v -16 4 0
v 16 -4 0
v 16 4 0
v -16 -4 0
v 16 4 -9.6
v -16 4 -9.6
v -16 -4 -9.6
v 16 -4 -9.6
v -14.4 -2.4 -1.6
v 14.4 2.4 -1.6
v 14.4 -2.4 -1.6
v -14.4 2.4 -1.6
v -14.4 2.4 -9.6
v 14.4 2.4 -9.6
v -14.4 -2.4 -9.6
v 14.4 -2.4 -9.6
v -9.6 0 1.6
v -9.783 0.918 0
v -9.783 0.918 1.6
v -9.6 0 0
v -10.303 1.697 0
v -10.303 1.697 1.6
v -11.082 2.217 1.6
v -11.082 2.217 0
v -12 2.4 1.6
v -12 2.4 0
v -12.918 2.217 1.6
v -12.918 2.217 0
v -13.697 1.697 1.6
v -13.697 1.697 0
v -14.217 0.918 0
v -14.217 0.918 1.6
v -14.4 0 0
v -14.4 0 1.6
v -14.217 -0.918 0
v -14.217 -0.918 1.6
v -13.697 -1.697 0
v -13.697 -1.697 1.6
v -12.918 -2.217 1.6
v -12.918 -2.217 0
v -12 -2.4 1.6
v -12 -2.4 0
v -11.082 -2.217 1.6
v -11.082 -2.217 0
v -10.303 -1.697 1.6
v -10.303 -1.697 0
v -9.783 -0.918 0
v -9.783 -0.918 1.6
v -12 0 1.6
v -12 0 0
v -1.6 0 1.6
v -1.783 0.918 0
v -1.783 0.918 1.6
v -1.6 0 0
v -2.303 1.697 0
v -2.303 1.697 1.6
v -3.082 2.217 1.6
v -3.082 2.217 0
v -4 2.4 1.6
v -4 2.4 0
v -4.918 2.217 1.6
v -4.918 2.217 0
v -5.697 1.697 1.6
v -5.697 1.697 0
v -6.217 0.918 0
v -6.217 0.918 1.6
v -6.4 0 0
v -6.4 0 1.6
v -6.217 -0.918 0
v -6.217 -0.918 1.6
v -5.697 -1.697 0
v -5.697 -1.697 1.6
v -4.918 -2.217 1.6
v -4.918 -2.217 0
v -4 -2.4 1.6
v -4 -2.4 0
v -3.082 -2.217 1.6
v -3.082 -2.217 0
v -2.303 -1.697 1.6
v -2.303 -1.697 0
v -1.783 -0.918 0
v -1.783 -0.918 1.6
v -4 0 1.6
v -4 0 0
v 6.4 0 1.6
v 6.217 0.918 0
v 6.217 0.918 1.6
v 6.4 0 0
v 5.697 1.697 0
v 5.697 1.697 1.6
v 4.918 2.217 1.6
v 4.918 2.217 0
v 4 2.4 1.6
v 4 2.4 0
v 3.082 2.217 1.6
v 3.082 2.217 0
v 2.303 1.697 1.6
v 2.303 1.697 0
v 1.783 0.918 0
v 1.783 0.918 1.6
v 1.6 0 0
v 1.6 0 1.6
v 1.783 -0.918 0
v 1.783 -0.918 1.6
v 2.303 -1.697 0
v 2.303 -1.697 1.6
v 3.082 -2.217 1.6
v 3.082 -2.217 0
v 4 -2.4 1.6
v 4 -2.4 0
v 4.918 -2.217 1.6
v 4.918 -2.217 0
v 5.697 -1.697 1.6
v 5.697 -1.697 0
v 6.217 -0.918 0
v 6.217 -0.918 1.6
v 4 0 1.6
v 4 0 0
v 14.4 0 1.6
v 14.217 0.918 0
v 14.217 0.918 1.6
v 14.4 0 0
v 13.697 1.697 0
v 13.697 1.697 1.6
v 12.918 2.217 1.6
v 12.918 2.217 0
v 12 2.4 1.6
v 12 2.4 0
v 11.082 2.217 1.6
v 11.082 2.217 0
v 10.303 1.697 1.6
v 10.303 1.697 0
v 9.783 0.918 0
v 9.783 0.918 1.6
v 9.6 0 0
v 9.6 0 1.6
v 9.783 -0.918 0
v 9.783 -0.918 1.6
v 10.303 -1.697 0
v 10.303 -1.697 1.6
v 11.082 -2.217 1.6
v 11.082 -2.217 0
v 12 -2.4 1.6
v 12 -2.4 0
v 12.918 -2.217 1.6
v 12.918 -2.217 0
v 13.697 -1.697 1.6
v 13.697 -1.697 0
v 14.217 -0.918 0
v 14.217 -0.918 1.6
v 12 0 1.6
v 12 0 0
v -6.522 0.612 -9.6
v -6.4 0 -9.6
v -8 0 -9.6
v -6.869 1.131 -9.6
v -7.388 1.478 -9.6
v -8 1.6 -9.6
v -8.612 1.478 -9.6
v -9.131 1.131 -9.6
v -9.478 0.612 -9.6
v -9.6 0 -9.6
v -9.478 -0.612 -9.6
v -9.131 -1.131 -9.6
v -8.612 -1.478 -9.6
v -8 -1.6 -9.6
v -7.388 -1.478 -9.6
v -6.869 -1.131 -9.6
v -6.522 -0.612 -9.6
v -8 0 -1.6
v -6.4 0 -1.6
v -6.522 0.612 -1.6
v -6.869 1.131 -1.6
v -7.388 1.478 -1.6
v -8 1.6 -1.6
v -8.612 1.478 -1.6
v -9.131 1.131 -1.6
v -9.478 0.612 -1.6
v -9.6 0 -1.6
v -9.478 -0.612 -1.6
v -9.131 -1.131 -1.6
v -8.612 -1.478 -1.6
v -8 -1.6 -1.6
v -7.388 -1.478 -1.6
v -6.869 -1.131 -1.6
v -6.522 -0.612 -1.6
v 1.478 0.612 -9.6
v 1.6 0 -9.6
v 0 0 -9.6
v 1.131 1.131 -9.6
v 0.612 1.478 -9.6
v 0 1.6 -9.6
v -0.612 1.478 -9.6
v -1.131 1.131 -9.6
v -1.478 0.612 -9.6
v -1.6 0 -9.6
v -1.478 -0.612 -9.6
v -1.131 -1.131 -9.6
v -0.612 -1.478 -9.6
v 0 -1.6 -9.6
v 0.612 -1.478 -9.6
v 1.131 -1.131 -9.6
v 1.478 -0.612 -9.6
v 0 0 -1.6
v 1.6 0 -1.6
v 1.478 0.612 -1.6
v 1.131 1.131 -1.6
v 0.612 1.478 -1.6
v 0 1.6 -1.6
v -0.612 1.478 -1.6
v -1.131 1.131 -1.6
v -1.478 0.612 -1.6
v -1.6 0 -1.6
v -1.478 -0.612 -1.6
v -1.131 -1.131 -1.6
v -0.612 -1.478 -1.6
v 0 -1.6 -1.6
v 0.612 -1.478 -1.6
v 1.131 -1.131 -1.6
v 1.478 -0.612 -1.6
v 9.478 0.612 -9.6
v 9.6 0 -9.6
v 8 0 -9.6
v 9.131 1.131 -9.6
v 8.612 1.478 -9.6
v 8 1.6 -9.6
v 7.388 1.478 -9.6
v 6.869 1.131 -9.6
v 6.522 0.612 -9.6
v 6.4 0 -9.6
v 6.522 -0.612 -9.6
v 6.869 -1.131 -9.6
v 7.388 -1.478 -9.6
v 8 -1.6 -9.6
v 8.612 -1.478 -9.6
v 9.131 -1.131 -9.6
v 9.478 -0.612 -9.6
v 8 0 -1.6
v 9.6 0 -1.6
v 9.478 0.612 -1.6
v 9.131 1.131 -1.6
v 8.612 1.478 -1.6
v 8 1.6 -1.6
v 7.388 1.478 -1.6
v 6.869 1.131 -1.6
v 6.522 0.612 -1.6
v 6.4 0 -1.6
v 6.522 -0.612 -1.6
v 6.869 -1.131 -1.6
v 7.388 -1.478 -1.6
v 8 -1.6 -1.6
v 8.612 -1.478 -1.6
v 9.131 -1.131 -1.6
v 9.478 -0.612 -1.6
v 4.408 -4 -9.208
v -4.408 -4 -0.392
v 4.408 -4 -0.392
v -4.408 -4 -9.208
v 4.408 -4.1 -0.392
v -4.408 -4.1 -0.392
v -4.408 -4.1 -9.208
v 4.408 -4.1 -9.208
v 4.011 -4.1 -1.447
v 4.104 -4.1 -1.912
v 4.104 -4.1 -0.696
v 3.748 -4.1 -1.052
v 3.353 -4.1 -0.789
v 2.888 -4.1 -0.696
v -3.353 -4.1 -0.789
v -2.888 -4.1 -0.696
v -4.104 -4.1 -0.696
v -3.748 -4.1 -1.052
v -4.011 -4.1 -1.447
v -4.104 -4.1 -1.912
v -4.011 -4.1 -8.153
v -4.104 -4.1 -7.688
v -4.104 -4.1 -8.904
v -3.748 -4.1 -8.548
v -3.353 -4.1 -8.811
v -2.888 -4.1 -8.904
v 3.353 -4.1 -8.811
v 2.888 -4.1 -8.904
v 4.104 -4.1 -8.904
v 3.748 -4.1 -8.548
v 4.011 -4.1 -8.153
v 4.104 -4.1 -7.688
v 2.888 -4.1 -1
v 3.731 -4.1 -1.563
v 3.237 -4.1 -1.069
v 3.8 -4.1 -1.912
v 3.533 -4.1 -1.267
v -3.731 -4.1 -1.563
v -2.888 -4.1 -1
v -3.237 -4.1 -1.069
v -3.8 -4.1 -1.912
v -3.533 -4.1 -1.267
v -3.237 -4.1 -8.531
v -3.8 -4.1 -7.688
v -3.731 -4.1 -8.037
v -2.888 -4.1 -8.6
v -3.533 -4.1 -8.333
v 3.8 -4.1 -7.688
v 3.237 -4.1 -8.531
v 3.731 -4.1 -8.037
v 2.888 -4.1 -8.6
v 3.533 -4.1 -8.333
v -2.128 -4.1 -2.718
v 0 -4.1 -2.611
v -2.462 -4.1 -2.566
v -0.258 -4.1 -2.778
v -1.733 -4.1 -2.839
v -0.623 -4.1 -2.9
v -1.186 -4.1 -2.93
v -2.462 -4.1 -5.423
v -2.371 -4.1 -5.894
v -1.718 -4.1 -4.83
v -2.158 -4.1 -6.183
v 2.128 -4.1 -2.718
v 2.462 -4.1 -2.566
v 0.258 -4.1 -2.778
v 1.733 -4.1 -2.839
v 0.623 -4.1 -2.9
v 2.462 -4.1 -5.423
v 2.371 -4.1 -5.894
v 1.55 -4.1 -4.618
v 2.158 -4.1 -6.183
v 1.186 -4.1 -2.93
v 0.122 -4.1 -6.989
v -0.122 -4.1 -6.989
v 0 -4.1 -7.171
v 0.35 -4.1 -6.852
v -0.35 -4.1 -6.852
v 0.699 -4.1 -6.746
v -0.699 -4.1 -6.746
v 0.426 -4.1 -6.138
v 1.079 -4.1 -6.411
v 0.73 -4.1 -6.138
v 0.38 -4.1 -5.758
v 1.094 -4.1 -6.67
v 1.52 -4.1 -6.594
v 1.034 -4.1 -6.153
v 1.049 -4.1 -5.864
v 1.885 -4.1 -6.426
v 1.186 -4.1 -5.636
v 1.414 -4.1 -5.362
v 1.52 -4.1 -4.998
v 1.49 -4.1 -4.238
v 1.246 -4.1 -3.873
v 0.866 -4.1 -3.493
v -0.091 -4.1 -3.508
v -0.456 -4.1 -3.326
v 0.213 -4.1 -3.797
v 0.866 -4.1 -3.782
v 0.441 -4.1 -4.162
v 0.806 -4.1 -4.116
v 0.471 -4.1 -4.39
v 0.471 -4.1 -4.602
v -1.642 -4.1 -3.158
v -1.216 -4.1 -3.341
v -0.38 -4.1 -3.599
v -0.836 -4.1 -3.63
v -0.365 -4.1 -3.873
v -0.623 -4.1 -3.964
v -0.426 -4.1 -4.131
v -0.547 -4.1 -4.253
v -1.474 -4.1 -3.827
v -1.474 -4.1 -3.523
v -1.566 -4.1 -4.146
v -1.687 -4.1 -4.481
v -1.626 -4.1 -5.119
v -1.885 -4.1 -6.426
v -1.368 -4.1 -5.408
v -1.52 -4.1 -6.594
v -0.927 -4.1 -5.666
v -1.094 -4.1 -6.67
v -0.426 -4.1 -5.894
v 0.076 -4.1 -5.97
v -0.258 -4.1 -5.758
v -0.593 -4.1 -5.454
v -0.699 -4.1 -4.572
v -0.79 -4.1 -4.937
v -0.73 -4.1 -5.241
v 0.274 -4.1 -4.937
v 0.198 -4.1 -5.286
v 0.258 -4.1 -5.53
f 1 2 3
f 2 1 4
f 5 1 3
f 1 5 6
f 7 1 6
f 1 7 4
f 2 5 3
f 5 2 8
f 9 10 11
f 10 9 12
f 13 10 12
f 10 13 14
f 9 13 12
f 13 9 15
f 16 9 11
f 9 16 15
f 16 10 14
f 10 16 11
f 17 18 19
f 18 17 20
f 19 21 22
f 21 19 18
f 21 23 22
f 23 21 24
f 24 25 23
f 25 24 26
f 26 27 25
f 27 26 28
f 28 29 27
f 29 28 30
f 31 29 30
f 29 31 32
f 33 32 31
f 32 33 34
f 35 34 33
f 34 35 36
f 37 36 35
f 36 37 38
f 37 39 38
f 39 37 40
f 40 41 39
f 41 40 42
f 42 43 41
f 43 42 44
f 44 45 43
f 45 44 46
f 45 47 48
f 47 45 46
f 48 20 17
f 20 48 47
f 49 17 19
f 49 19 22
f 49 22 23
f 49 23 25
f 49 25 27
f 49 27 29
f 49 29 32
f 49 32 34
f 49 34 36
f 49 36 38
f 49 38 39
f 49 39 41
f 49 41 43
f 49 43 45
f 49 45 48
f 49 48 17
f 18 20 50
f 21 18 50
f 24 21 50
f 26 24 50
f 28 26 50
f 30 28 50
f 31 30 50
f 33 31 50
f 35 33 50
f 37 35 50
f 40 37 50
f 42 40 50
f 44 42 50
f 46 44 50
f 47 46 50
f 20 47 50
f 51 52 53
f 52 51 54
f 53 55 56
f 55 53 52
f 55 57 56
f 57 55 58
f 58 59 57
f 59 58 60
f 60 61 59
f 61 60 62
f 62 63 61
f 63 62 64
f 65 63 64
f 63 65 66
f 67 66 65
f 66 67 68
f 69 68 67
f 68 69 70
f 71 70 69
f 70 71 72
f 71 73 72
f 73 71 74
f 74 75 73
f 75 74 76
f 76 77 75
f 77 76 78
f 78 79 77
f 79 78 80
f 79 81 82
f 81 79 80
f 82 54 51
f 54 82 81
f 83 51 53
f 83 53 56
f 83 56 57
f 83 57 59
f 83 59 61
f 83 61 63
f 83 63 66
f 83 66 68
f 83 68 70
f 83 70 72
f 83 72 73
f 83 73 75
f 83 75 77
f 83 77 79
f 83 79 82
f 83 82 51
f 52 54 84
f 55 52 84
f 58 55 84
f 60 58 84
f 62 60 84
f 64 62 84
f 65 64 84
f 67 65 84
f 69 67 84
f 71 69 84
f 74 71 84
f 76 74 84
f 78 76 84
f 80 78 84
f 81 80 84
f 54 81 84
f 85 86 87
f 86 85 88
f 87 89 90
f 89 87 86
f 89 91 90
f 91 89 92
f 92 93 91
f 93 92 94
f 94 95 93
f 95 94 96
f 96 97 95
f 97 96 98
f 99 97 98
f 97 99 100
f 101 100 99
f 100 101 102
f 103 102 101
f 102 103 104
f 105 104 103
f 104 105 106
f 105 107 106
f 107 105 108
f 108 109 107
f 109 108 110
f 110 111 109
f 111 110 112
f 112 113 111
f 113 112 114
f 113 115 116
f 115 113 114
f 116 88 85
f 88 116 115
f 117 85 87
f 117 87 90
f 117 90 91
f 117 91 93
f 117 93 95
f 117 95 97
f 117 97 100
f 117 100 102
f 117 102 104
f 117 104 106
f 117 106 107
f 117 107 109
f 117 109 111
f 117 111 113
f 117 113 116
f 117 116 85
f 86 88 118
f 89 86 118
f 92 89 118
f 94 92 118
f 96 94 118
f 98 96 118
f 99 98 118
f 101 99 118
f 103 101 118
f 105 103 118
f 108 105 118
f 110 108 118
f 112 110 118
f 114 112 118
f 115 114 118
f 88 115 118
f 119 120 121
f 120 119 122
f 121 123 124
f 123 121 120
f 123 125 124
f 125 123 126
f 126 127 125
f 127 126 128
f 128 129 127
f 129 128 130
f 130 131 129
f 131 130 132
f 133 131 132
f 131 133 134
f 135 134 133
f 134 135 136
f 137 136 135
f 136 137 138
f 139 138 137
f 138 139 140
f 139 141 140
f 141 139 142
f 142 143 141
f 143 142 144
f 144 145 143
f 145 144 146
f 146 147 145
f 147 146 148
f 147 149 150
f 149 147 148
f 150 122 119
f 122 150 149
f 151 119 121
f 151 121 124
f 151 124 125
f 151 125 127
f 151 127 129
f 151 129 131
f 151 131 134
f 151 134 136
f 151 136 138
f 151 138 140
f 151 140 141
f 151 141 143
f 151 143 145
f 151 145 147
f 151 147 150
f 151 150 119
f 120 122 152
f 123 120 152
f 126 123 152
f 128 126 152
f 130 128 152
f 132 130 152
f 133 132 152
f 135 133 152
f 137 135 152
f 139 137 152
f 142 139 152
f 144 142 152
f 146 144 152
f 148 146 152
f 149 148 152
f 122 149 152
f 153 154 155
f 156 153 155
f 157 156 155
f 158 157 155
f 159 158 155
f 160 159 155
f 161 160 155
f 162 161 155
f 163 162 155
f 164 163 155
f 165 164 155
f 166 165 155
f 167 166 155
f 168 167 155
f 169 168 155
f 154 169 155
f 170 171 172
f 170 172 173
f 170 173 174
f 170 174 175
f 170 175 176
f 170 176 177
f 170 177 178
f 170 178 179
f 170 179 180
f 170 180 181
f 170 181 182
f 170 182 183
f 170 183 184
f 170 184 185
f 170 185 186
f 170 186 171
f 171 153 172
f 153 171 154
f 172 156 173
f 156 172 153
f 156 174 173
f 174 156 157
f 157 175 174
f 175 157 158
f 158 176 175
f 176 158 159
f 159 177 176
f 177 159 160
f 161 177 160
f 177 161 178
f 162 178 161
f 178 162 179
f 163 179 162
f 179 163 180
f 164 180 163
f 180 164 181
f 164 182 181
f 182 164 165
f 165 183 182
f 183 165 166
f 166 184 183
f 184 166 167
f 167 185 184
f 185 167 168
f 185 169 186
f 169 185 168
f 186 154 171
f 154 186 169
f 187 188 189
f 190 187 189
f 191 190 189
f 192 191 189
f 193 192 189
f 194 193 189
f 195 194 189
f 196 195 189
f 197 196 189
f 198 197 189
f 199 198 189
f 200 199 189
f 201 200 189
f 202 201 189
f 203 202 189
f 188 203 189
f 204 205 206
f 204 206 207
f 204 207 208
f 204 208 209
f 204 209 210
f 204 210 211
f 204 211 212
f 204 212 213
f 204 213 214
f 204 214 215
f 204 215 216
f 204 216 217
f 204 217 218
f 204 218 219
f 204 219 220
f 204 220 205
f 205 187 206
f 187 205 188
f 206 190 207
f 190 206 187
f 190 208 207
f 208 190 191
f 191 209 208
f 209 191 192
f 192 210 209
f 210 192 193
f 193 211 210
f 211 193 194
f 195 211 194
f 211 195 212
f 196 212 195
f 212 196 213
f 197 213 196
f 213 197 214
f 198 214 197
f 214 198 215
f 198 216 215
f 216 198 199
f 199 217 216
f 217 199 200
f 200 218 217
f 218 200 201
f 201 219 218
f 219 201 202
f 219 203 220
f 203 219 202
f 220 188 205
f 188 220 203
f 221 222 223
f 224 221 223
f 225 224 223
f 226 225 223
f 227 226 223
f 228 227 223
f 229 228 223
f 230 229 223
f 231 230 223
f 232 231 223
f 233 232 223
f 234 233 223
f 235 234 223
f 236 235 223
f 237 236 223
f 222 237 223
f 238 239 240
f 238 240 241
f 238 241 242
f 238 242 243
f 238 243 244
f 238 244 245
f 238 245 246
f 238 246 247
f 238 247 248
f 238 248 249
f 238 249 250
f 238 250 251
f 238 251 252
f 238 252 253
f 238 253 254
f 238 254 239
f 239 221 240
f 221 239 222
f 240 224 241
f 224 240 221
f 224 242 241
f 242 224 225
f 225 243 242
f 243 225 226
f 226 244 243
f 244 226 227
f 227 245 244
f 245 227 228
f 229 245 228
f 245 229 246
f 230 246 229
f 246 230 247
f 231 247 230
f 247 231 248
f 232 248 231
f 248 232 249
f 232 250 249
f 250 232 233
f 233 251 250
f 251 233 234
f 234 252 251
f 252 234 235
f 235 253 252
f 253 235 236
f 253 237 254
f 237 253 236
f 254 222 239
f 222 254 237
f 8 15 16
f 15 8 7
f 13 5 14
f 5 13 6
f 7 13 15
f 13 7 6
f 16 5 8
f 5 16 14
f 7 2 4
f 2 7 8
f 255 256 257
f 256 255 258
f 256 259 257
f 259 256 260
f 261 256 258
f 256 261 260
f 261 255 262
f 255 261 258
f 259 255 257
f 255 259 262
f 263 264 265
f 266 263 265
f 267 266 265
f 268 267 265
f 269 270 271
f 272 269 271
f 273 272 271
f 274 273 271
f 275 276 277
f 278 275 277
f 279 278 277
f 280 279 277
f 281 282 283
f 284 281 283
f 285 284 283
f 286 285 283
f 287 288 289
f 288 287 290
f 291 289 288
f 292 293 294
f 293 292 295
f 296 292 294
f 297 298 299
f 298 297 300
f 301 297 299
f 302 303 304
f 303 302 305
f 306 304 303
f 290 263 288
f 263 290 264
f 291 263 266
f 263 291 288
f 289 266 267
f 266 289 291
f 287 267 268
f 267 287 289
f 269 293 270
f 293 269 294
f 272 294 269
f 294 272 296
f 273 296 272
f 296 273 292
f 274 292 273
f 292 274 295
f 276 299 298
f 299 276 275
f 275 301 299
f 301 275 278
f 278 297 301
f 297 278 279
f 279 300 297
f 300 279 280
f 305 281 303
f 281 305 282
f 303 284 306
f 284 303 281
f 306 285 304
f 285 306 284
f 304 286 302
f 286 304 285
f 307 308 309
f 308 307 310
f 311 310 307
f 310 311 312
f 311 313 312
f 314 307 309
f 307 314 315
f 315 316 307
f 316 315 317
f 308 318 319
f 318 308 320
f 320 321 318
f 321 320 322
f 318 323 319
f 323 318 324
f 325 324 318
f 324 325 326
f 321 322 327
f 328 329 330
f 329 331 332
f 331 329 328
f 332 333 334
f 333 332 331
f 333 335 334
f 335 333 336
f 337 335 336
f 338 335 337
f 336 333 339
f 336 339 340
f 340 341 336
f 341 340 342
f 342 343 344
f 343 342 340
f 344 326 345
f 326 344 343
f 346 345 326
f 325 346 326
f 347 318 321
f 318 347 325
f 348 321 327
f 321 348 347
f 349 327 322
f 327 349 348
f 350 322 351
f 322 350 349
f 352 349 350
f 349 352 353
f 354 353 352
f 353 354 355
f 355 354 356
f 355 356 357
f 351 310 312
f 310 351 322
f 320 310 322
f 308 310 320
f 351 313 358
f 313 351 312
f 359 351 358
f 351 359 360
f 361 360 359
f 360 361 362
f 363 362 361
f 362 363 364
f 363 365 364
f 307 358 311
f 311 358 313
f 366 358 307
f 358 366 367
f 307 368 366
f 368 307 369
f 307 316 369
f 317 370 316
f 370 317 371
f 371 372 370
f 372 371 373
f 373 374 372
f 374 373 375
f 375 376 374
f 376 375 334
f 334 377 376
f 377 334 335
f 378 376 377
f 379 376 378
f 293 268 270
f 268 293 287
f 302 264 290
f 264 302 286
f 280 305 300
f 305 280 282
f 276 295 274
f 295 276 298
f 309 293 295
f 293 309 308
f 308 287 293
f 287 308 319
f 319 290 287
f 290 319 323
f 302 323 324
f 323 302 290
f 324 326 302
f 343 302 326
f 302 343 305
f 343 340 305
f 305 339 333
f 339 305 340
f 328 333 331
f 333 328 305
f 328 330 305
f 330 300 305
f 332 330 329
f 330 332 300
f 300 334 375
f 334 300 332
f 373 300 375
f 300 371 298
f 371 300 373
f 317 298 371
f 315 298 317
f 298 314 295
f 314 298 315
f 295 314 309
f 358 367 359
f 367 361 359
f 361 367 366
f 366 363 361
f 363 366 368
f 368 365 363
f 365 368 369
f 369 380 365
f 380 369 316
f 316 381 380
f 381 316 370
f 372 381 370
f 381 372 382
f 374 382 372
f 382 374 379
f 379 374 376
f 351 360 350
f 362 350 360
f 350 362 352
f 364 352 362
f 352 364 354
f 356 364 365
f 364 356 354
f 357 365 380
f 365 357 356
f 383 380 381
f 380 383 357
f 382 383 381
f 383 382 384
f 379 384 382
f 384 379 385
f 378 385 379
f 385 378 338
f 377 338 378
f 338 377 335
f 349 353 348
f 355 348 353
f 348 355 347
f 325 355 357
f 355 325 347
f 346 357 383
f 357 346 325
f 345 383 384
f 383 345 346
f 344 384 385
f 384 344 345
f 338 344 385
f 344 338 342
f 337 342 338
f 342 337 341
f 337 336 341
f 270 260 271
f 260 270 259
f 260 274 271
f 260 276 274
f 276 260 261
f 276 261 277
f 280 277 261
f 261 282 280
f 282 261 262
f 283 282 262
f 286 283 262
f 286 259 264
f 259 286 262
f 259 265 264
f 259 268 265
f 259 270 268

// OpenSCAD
use <../lib.scad>
use <169575a.scad>
use <3010.scad>
function ldraw_lib__3010d0p() = [
// 0 Brick  1 x  4 with Fire Logo Badge Sticker
// 0 Name: 3010d0p.dat
// 0 Author: Chris Böhnke [KnightOfTarenta]
// 0 !LDRAW_ORG Shortcut UPDATE 2026-06
// 0 !LICENSE Licensed under CC BY 4.0 : see CAreadme.txt
// 
// 0 BFC CERTIFY CCW
  [0,"BFC","CERTIFY"],
  [0,"BFC","CCW"],
// 
// 0 !CATEGORY Sticker Shortcut
// 
// 0 !KEYWORDS Blaze Commander, Bricklink 3010pb056, BrickOwl 550383, Fire 1994
// 0 !KEYWORDS Fire Fighters, Fire Station, Rebrickable 169575, Set 6525, town
// 
// 0 !HISTORY 2026-06-28 [OrionP] Official Update 2026-06
// 
// 1 16 0 0 0 1 0 0 0 1 0 0 0 1 3010.dat
  [1,16,0,0,0,1,0,0,0,1,0,0,0,1, ldraw_lib__3010()],
// 1 16 0 12 -10 1 0 0 0 0 -1 0 1 0 169575a.dat
  [1,16,0,12,-10,1,0,0,0,0,-1,0,1,0, ldraw_lib__169575a()],
];
module ldraw_lib__3010d0p(step=0, col=false, unit=2/5, alt=false, line=0.2, solid=!$preview)
    makepoly(ldraw_lib__3010d0p(), step=step, col=col, unit=unit, alt=alt, line=line, solid=solid);
ldraw_lib__3010d0p(line=0.2);
